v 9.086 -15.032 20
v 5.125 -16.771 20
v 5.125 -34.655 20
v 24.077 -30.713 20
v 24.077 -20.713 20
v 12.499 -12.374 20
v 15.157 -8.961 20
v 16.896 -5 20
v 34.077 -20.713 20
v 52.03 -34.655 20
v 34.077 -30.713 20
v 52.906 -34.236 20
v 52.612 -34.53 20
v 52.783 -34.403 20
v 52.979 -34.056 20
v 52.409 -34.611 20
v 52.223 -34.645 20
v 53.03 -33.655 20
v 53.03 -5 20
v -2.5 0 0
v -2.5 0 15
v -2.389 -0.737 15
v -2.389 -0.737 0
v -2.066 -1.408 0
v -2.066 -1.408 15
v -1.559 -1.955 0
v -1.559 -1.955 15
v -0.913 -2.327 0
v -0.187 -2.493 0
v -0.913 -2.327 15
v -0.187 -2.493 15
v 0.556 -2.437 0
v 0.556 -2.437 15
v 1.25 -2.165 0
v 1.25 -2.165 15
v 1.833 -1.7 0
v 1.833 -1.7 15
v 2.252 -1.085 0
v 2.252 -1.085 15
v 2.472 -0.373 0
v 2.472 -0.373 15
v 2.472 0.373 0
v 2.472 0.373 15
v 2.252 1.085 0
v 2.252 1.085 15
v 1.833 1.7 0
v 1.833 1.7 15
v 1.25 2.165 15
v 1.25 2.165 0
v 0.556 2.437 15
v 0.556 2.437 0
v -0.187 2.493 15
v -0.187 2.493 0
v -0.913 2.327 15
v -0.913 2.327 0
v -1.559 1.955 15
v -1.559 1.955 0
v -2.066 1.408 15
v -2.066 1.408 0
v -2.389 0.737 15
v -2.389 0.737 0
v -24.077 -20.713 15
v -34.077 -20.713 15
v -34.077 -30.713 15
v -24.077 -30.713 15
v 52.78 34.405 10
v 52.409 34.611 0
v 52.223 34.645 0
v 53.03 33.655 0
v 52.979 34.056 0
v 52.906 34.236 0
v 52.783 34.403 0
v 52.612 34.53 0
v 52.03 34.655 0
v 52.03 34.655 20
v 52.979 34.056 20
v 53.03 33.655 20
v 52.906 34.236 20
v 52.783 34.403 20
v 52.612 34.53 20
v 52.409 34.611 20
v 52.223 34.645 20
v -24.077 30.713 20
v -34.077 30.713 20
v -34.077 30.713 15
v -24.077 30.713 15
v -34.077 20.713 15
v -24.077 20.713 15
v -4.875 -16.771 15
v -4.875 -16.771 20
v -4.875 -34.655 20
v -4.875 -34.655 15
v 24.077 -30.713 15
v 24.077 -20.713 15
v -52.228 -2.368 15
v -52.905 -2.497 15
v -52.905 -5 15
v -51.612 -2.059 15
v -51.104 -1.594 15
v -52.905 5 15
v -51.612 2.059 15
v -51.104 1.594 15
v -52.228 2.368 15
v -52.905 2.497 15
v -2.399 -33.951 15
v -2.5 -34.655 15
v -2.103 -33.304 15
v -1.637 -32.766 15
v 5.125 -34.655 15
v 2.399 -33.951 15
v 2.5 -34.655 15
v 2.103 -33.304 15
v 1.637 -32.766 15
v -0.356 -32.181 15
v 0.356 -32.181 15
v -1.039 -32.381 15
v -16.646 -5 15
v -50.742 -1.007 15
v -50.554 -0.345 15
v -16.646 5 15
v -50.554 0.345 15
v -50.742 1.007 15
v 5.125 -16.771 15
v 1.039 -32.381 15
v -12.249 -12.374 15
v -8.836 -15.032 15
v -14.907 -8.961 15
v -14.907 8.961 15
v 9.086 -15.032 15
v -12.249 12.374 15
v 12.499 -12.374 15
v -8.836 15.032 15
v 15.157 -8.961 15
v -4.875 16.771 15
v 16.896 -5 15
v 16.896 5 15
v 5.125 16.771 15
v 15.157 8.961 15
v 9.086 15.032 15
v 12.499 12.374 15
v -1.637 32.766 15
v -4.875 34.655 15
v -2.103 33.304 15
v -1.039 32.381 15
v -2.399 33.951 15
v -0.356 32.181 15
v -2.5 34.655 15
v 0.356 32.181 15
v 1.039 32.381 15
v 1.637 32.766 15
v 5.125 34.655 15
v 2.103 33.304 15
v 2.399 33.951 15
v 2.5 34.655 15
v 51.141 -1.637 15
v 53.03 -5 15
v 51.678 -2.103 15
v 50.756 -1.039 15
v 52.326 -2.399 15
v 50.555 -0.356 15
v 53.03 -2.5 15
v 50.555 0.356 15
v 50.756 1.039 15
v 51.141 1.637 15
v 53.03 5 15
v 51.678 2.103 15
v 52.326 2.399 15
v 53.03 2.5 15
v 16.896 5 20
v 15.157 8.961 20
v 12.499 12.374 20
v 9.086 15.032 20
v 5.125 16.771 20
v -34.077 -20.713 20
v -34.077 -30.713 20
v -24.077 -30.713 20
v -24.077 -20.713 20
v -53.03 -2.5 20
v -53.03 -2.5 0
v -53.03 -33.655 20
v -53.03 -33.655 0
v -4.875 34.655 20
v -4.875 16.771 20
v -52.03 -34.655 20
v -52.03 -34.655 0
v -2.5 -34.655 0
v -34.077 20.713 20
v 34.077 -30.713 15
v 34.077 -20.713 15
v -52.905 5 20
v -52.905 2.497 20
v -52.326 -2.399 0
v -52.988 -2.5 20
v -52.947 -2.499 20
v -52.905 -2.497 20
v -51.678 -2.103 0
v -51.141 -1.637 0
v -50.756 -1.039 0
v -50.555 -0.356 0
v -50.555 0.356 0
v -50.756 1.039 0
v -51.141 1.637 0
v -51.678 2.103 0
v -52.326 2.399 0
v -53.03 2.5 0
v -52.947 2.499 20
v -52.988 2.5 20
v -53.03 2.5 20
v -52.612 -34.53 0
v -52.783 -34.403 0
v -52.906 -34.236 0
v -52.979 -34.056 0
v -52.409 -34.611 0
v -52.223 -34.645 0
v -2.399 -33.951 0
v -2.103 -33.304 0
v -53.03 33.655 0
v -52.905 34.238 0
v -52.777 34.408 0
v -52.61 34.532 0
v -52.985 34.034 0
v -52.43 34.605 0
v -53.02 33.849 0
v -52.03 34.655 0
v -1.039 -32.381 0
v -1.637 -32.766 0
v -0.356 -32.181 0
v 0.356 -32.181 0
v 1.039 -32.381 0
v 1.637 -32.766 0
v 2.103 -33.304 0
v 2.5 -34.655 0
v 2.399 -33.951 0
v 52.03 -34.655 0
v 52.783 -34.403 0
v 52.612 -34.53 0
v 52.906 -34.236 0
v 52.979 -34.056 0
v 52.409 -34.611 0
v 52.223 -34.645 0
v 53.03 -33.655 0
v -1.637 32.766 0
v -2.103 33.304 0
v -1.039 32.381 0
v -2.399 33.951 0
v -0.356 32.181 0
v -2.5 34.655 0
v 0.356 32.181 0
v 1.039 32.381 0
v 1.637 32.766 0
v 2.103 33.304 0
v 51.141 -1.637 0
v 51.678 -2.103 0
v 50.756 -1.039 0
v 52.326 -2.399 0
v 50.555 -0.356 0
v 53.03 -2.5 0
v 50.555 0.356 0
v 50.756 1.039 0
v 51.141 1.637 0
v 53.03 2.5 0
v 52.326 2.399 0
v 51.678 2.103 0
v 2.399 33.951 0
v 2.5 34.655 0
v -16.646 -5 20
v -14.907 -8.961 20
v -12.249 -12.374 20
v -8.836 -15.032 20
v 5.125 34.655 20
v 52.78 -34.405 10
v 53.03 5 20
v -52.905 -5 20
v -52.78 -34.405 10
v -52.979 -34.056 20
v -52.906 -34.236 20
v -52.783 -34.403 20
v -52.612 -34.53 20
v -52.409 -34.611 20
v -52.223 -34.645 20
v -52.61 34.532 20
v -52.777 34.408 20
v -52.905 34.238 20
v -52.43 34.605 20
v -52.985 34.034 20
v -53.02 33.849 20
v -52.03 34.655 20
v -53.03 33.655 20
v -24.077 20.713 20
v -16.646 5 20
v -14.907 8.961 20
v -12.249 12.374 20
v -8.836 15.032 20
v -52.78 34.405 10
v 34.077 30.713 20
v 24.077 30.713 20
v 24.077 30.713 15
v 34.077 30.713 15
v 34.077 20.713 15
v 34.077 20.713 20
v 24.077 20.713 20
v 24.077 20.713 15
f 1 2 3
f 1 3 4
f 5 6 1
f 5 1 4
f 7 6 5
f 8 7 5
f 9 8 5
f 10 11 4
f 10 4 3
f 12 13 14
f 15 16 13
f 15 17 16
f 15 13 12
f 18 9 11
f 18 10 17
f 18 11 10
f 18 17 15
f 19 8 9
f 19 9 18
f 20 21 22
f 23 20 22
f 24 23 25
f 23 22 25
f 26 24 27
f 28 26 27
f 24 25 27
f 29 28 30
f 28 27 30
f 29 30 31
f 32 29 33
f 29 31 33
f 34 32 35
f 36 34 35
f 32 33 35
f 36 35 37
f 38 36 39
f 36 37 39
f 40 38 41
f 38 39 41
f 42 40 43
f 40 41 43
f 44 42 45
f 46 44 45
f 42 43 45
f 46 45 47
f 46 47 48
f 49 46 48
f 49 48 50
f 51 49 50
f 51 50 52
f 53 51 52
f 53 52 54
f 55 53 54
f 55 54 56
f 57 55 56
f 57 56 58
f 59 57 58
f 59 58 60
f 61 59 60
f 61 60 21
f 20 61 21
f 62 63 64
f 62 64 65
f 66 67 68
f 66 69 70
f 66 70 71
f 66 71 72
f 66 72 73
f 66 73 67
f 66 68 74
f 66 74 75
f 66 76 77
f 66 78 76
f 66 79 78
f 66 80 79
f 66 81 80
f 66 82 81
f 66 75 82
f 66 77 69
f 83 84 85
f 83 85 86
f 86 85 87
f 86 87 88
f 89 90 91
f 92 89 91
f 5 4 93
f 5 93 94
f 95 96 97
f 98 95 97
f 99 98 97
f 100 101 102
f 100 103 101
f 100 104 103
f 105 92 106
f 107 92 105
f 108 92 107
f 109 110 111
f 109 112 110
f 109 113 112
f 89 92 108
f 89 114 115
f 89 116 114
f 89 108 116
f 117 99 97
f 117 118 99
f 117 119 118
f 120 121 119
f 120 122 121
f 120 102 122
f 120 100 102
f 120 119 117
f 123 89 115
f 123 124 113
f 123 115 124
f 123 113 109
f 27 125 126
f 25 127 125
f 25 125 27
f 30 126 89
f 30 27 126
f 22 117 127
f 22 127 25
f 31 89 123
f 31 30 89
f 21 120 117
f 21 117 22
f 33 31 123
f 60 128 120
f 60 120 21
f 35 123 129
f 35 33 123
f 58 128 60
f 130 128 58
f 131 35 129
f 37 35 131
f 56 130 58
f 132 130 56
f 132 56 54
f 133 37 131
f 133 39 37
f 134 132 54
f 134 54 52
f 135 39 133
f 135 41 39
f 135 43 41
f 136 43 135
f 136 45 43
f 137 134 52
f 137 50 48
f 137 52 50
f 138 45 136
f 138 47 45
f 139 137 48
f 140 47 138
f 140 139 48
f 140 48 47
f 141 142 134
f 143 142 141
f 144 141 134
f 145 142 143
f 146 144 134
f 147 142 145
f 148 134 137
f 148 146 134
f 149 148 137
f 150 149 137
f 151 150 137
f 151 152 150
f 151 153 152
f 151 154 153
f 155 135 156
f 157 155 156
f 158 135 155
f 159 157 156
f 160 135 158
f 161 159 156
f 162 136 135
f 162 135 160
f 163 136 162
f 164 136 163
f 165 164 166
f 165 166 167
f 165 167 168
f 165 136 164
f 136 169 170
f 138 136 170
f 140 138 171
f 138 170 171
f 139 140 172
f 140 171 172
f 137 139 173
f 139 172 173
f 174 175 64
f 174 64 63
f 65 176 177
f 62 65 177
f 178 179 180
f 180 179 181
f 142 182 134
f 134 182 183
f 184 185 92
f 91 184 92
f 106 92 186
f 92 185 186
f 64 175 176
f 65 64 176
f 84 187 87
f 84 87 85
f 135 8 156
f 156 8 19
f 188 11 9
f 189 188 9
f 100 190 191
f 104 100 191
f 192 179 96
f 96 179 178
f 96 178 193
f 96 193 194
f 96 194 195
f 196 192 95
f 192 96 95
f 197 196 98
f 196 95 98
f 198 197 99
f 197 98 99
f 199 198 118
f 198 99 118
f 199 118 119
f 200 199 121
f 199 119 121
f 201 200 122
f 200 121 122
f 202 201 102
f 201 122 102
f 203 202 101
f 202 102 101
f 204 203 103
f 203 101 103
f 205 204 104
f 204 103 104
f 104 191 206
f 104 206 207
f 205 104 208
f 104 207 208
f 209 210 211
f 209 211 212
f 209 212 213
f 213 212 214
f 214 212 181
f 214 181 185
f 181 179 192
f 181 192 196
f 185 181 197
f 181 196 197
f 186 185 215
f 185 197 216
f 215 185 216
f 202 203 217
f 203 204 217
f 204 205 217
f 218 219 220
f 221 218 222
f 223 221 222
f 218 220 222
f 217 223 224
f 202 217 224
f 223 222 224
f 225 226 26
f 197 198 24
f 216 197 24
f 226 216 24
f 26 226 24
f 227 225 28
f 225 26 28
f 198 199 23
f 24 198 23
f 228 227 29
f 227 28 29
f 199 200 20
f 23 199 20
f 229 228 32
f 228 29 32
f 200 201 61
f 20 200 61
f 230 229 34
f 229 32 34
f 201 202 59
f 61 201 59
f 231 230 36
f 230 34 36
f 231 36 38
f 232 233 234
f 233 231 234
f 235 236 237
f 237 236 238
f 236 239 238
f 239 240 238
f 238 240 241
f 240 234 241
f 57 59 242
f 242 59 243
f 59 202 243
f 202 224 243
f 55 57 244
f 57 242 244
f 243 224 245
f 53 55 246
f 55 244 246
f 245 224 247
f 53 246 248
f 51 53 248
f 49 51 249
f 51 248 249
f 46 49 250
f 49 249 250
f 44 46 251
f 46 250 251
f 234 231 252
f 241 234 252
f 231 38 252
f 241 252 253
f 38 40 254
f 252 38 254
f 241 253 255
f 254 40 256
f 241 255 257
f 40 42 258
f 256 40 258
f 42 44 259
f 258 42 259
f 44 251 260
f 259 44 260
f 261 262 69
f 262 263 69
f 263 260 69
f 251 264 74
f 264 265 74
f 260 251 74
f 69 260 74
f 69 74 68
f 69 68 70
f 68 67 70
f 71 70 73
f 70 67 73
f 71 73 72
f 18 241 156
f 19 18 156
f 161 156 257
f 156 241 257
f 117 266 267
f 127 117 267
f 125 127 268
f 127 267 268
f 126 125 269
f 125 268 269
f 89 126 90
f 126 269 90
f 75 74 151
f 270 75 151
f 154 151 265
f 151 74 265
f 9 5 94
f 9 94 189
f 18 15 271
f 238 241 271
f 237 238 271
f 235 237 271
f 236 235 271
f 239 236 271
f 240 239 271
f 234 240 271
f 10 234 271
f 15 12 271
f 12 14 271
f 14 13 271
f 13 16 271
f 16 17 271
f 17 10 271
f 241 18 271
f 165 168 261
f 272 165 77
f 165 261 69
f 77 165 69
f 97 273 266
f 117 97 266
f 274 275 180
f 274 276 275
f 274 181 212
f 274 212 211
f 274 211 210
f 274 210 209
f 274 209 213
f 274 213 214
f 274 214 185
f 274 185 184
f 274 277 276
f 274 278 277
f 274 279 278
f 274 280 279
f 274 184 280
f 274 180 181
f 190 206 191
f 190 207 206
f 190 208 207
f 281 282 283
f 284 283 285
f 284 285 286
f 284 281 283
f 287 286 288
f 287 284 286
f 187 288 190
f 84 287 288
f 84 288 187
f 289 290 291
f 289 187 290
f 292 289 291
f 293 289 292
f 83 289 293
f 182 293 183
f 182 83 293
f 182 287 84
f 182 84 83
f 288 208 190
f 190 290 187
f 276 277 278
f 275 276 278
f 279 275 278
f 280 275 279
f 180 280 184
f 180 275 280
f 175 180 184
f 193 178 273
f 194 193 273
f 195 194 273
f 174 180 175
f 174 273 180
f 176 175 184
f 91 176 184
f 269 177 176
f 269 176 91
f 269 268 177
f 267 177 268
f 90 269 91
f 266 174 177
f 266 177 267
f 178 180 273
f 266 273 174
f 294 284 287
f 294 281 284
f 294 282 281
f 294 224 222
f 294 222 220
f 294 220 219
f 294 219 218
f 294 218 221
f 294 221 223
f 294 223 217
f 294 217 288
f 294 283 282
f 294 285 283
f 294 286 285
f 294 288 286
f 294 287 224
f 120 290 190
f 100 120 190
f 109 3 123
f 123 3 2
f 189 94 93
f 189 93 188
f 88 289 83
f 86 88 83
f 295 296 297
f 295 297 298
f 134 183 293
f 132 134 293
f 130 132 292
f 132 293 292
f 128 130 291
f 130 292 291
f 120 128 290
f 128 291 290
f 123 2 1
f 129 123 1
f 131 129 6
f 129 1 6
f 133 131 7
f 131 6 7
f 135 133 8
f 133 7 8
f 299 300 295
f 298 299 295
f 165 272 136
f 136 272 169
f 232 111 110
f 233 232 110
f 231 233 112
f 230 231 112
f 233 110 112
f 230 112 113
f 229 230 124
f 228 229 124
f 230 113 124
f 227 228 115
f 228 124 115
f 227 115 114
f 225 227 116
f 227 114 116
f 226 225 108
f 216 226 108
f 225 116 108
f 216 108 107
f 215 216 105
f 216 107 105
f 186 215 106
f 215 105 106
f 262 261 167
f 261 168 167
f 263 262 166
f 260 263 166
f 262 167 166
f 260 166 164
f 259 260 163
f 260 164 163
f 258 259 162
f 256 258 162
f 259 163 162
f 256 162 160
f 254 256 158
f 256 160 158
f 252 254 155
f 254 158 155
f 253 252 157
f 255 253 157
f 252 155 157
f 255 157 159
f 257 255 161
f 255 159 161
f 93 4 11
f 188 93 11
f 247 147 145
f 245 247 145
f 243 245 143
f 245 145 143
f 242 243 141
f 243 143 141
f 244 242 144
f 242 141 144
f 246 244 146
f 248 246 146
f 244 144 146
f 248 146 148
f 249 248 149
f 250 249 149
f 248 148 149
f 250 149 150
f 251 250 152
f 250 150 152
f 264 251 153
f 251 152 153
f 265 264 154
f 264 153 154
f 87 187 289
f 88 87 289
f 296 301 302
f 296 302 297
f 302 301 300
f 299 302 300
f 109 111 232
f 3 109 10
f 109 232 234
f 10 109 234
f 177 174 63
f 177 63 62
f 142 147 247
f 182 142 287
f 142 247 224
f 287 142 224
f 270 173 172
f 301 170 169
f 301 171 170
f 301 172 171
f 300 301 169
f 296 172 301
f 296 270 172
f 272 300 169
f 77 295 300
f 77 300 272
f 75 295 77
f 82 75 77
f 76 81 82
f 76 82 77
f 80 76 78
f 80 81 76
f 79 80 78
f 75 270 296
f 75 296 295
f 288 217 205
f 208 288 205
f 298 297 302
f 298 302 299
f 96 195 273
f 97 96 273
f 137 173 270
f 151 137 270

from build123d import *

# Parameters (mm, degrees)
F1_DEPTH    = 20
F3_DEPTH    = 5
F4_W        = 10
F4_H        = 10
F5_DEPTH    = 5
F6_D        = 5
F7_D        = 5
F8_T1_DEPTH = 25


# Not quite as in the source:
# - a fillet or chamfer that OpenCascade refuses, or shapes differently, is made with other operations: its cross-section is extruded or revolved along the edge and cut away or added


with BuildPart() as f1:
    # F0 (on Top) → F1 (new body)
    with BuildSketch(Plane.XY):
        with BuildLine():
            Line((16.7705098646, 4.9999998882), (53.0298836529, 4.9999998882))
            Line((53.0298836529, 4.9999998882), (53.0298836529, 34.6554927528))
            Line((53.0298836529, 34.6554927528), (5, 34.6554927528))
            Line((5, 34.6554927528), (5, 16.7705098312))
            ThreePointArc((5, 16.7705098312), (12.374368712, 12.3743686295), (16.7705098646, 4.9999998882))
        make_face()
        with BuildLine():
            Line((5, 16.7705098312), (5, 34.6554927528))
            Line((5, 34.6554927528), (-5, 34.6554927528))
            Line((-5, 34.6554927528), (-5, 16.7705098312))
            ThreePointArc((-5, 16.7705098312), (0, 17.5), (5, 16.7705098312))
        make_face()
        with BuildLine():
            Line((-53.0298836529, 34.6554927528), (-53.0298836529, 4.9999998882))
            Line((-53.0298836529, 4.9999998882), (-16.7705098646, 4.9999998882))
            ThreePointArc((-16.7705098646, 4.9999998882), (-12.374368712, 12.3743686295), (-5, 16.7705098312))
            Line((-5, 16.7705098312), (-5, 34.6554927528))
            Line((-5, 34.6554927528), (-53.0298836529, 34.6554927528))
        make_face()
        with BuildLine():
            Line((-53.0298836529, -34.6554927528), (-5, -34.6554927528))
            Line((-5, -34.6554927528), (-5, -16.7705098312))
            ThreePointArc((-5, -16.7705098312), (-12.374368712, -12.3743686295), (-16.7705098646, -4.9999998882))
            Line((-16.7705098646, -4.9999998882), (-53.0298836529, -4.9999998882))
            Line((-53.0298836529, -4.9999998882), (-53.0298836529, -34.6554927528))
        make_face()
        with BuildLine():
            Line((5, -34.6554927528), (53.0298836529, -34.6554927528))
            Line((53.0298836529, -34.6554927528), (53.0298836529, -4.9999998882))
            Line((53.0298836529, -4.9999998882), (16.7705098646, -4.9999998882))
            ThreePointArc((16.7705098646, -4.9999998882), (12.374368712, -12.3743686295), (5, -16.7705098312))
            Line((5, -16.7705098312), (5, -34.6554927528))
        make_face()
        with BuildLine():
            Line((16.7705098646, -4.9999998882), (53.0298836529, -4.9999998882))
            Line((53.0298836529, -4.9999998882), (53.0298836529, 4.9999998882))
            Line((53.0298836529, 4.9999998882), (16.7705098646, 4.9999998882))
            ThreePointArc((16.7705098646, 4.9999998882), (17.3166671538, 2.5264676299), (17.5, 0))
            ThreePointArc((17.5, 0), (17.3166671538, -2.5264676299), (16.7705098646, -4.9999998882))
        make_face()
        with BuildLine():
            ThreePointArc((-5, -16.7705098312), (0, -17.5), (5, -16.7705098312))
            ThreePointArc((5, -16.7705098312), (12.374368712, -12.3743686295), (16.7705098646, -4.9999998882))
            ThreePointArc((16.7705098646, -4.9999998882), (17.3166671538, -2.5264676299), (17.5, 0))
            ThreePointArc((17.5, 0), (17.3166671538, 2.5264676299), (16.7705098646, 4.9999998882))
            ThreePointArc((16.7705098646, 4.9999998882), (12.374368712, 12.3743686295), (5, 16.7705098312))
            ThreePointArc((5, 16.7705098312), (0, 17.5), (-5, 16.7705098312))
            ThreePointArc((-5, 16.7705098312), (-12.374368712, 12.3743686295), (-16.7705098646, 4.9999998882))
            ThreePointArc((-16.7705098646, 4.9999998882), (-17.5, 0), (-16.7705098646, -4.9999998882))
            ThreePointArc((-16.7705098646, -4.9999998882), (-12.374368712, -12.3743686295), (-5, -16.7705098312))
        make_face()
        with BuildLine():
            Line((-53.0298836529, 4.9999998882), (-53.0298836529, -4.9999998882))
            Line((-53.0298836529, -4.9999998882), (-16.7705098646, -4.9999998882))
            ThreePointArc((-16.7705098646, -4.9999998882), (-17.5, 0), (-16.7705098646, 4.9999998882))
            Line((-16.7705098646, 4.9999998882), (-53.0298836529, 4.9999998882))
        make_face()
        with BuildLine():
            Line((-5, -34.6554927528), (5, -34.6554927528))
            Line((5, -34.6554927528), (5, -16.7705098312))
            ThreePointArc((5, -16.7705098312), (0, -17.5), (-5, -16.7705098312))
            Line((-5, -16.7705098312), (-5, -34.6554927528))
        make_face()
    extrude(amount=F1_DEPTH)

    # F2 (on face) → F3 (cut)
    with BuildSketch(Plane.XY.offset(20)):
        with BuildLine():
            Line((-52.9048836529, 4.9999998882), (-52.9048836529, -4.9999998882))
            Line((-52.9048836529, -4.9999998882), (-16.6455098646, -4.9999998882))
            ThreePointArc((-16.6455098646, -4.9999998882), (-17.375, 0), (-16.6455098646, 4.9999998882))
            Line((-16.6455098646, 4.9999998882), (-52.9048836529, 4.9999998882))
        make_face()
        with BuildLine():
            ThreePointArc((-4.875, 16.7705098312), (0.125, 17.5), (5.125, 16.7705098312))
            Line((5.125, 16.7705098312), (5.125, 34.6554927528))
            Line((5.125, 34.6554927528), (-4.875, 34.6554927528))
            Line((-4.875, 34.6554927528), (-4.875, 16.7705098312))
        make_face()
        with BuildLine():
            ThreePointArc((-4.875, -16.7705098312), (0.125, -17.5), (5.125, -16.7705098312))
            ThreePointArc((5.125, -16.7705098312), (12.499368712, -12.3743686295), (16.8955098646, -4.9999998882))
            ThreePointArc((16.8955098646, -4.9999998882), (17.4416671538, -2.5264676299), (17.625, 0))
            ThreePointArc((17.625, 0), (17.4416671538, 2.5264676299), (16.8955098646, 4.9999998882))
            ThreePointArc((16.8955098646, 4.9999998882), (12.499368712, 12.3743686295), (5.125, 16.7705098312))
            ThreePointArc((5.125, 16.7705098312), (0.125, 17.5), (-4.875, 16.7705098312))
            ThreePointArc((-4.875, 16.7705098312), (-12.249368712, 12.3743686295), (-16.6455098646, 4.9999998882))
            ThreePointArc((-16.6455098646, 4.9999998882), (-17.375, 0), (-16.6455098646, -4.9999998882))
            ThreePointArc((-16.6455098646, -4.9999998882), (-12.249368712, -12.3743686295), (-4.875, -16.7705098312))
        make_face()
        with BuildLine():
            Line((16.8955098646, -4.9999998882), (53.0298836529, -4.9999998882))
            Line((53.0298836529, -4.9999998882), (53.0298836529, 4.9999998882))
            Line((53.0298836529, 4.9999998882), (16.8955098646, 4.9999998882))
            ThreePointArc((16.8955098646, 4.9999998882), (17.4416671538, 2.5264676299), (17.625, 0))
            ThreePointArc((17.625, 0), (17.4416671538, -2.5264676299), (16.8955098646, -4.9999998882))
        make_face()
        with BuildLine():
            Line((-4.875, -34.6554927528), (5.125, -34.6554927528))
            Line((5.125, -34.6554927528), (5.125, -16.7705098312))
            ThreePointArc((5.125, -16.7705098312), (0.125, -17.5), (-4.875, -16.7705098312))
            Line((-4.875, -16.7705098312), (-4.875, -34.6554927528))
        make_face()
    extrude(amount=-F3_DEPTH, mode=Mode.SUBTRACT)

    # F4 (on face) → F5 (cut)
    with BuildSketch(Plane.XY.offset(20)):
        with Locations((-29.0774418265, 25.713001292)):
            Rectangle(F4_W, F4_H)
        with Locations((29.0774418265, 25.713001292)):
            Rectangle(F4_W, F4_H)
        with Locations((29.0774418265, -25.713001292)):
            Rectangle(F4_W, F4_H)
        with Locations((-29.0774418265, -25.713001292)):
            Rectangle(F4_W, F4_H)
    extrude(amount=-F5_DEPTH, mode=Mode.SUBTRACT)

    # F6 (through all)
    with Locations(Plane(origin=(0, 0, 0), x_dir=(1, 0, 0), z_dir=(0, 0, -1))):
        with Locations((0, 34.6554927528), (0, -34.6554927528), (-53.0298836529, 0), (0, 0)):
            Hole(F6_D / 2)

    # F7 (through all)
    with Locations(Plane(origin=(0, 0, 0), x_dir=(1, 0, 0), z_dir=(0, 0, -1))):
        with Locations((53.0298836529, 0)):
            Hole(F7_D / 2)

    # F8: fillet of radius 1 on 4 edges, made by hand

    # F8_s2 → F8_t1 (cut)
    with BuildSketch(Plane.XY.offset(-2.5)):
        with BuildLine():
            add(Edge.make_bspline(
                [(52.0298836529, -34.6554927528), (53.0298836529, -34.6554927528), (53.0298836529, -33.6554927528)],
                knots=[0, 0, 0, 1, 1, 1], degree=2, weights=[1, 1, 1]))
            Line((53.0298836529, -33.6554927528), (53.0298836529, -34.6554927528))
            Line((53.0298836529, -34.6554927528), (52.0298836529, -34.6554927528))
        make_face()
        with BuildLine():
            add(Edge.make_bspline(
                [(52.0298836529, 34.6554927528), (53.0298836529, 34.6554927528), (53.0298836529, 33.6554927528)],
                knots=[0, 0, 0, 1, 1, 1], degree=2, weights=[1, 1, 1]))
            Line((53.0298836529, 33.6554927528), (53.0298836529, 34.6554927528))
            Line((53.0298836529, 34.6554927528), (52.0298836529, 34.6554927528))
        make_face()
        with BuildLine():
            add(Edge.make_bspline(
                [(-52.0298836529, -34.6554927528), (-53.0298836529, -34.6554927528), (-53.0298836529, -33.6554927528)],
                knots=[0, 0, 0, 1, 1, 1], degree=2, weights=[1, 1, 1]))
            Line((-53.0298836529, -33.6554927528), (-53.0298836529, -34.6554927528))
            Line((-53.0298836529, -34.6554927528), (-52.0298836529, -34.6554927528))
        make_face()
        with BuildLine():
            add(Edge.make_bspline(
                [(-53.0298836529, 33.6554927528), (-53.0298836529, 34.6554927528), (-52.0298836529, 34.6554927528)],
                knots=[0, 0, 0, 1, 1, 1], degree=2, weights=[1, 1, 1]))
            Line((-52.0298836529, 34.6554927528), (-53.0298836529, 34.6554927528))
            Line((-53.0298836529, 34.6554927528), (-53.0298836529, 33.6554927528))
        make_face()
    extrude(amount=F8_T1_DEPTH, mode=Mode.SUBTRACT)


solid = f1.part
